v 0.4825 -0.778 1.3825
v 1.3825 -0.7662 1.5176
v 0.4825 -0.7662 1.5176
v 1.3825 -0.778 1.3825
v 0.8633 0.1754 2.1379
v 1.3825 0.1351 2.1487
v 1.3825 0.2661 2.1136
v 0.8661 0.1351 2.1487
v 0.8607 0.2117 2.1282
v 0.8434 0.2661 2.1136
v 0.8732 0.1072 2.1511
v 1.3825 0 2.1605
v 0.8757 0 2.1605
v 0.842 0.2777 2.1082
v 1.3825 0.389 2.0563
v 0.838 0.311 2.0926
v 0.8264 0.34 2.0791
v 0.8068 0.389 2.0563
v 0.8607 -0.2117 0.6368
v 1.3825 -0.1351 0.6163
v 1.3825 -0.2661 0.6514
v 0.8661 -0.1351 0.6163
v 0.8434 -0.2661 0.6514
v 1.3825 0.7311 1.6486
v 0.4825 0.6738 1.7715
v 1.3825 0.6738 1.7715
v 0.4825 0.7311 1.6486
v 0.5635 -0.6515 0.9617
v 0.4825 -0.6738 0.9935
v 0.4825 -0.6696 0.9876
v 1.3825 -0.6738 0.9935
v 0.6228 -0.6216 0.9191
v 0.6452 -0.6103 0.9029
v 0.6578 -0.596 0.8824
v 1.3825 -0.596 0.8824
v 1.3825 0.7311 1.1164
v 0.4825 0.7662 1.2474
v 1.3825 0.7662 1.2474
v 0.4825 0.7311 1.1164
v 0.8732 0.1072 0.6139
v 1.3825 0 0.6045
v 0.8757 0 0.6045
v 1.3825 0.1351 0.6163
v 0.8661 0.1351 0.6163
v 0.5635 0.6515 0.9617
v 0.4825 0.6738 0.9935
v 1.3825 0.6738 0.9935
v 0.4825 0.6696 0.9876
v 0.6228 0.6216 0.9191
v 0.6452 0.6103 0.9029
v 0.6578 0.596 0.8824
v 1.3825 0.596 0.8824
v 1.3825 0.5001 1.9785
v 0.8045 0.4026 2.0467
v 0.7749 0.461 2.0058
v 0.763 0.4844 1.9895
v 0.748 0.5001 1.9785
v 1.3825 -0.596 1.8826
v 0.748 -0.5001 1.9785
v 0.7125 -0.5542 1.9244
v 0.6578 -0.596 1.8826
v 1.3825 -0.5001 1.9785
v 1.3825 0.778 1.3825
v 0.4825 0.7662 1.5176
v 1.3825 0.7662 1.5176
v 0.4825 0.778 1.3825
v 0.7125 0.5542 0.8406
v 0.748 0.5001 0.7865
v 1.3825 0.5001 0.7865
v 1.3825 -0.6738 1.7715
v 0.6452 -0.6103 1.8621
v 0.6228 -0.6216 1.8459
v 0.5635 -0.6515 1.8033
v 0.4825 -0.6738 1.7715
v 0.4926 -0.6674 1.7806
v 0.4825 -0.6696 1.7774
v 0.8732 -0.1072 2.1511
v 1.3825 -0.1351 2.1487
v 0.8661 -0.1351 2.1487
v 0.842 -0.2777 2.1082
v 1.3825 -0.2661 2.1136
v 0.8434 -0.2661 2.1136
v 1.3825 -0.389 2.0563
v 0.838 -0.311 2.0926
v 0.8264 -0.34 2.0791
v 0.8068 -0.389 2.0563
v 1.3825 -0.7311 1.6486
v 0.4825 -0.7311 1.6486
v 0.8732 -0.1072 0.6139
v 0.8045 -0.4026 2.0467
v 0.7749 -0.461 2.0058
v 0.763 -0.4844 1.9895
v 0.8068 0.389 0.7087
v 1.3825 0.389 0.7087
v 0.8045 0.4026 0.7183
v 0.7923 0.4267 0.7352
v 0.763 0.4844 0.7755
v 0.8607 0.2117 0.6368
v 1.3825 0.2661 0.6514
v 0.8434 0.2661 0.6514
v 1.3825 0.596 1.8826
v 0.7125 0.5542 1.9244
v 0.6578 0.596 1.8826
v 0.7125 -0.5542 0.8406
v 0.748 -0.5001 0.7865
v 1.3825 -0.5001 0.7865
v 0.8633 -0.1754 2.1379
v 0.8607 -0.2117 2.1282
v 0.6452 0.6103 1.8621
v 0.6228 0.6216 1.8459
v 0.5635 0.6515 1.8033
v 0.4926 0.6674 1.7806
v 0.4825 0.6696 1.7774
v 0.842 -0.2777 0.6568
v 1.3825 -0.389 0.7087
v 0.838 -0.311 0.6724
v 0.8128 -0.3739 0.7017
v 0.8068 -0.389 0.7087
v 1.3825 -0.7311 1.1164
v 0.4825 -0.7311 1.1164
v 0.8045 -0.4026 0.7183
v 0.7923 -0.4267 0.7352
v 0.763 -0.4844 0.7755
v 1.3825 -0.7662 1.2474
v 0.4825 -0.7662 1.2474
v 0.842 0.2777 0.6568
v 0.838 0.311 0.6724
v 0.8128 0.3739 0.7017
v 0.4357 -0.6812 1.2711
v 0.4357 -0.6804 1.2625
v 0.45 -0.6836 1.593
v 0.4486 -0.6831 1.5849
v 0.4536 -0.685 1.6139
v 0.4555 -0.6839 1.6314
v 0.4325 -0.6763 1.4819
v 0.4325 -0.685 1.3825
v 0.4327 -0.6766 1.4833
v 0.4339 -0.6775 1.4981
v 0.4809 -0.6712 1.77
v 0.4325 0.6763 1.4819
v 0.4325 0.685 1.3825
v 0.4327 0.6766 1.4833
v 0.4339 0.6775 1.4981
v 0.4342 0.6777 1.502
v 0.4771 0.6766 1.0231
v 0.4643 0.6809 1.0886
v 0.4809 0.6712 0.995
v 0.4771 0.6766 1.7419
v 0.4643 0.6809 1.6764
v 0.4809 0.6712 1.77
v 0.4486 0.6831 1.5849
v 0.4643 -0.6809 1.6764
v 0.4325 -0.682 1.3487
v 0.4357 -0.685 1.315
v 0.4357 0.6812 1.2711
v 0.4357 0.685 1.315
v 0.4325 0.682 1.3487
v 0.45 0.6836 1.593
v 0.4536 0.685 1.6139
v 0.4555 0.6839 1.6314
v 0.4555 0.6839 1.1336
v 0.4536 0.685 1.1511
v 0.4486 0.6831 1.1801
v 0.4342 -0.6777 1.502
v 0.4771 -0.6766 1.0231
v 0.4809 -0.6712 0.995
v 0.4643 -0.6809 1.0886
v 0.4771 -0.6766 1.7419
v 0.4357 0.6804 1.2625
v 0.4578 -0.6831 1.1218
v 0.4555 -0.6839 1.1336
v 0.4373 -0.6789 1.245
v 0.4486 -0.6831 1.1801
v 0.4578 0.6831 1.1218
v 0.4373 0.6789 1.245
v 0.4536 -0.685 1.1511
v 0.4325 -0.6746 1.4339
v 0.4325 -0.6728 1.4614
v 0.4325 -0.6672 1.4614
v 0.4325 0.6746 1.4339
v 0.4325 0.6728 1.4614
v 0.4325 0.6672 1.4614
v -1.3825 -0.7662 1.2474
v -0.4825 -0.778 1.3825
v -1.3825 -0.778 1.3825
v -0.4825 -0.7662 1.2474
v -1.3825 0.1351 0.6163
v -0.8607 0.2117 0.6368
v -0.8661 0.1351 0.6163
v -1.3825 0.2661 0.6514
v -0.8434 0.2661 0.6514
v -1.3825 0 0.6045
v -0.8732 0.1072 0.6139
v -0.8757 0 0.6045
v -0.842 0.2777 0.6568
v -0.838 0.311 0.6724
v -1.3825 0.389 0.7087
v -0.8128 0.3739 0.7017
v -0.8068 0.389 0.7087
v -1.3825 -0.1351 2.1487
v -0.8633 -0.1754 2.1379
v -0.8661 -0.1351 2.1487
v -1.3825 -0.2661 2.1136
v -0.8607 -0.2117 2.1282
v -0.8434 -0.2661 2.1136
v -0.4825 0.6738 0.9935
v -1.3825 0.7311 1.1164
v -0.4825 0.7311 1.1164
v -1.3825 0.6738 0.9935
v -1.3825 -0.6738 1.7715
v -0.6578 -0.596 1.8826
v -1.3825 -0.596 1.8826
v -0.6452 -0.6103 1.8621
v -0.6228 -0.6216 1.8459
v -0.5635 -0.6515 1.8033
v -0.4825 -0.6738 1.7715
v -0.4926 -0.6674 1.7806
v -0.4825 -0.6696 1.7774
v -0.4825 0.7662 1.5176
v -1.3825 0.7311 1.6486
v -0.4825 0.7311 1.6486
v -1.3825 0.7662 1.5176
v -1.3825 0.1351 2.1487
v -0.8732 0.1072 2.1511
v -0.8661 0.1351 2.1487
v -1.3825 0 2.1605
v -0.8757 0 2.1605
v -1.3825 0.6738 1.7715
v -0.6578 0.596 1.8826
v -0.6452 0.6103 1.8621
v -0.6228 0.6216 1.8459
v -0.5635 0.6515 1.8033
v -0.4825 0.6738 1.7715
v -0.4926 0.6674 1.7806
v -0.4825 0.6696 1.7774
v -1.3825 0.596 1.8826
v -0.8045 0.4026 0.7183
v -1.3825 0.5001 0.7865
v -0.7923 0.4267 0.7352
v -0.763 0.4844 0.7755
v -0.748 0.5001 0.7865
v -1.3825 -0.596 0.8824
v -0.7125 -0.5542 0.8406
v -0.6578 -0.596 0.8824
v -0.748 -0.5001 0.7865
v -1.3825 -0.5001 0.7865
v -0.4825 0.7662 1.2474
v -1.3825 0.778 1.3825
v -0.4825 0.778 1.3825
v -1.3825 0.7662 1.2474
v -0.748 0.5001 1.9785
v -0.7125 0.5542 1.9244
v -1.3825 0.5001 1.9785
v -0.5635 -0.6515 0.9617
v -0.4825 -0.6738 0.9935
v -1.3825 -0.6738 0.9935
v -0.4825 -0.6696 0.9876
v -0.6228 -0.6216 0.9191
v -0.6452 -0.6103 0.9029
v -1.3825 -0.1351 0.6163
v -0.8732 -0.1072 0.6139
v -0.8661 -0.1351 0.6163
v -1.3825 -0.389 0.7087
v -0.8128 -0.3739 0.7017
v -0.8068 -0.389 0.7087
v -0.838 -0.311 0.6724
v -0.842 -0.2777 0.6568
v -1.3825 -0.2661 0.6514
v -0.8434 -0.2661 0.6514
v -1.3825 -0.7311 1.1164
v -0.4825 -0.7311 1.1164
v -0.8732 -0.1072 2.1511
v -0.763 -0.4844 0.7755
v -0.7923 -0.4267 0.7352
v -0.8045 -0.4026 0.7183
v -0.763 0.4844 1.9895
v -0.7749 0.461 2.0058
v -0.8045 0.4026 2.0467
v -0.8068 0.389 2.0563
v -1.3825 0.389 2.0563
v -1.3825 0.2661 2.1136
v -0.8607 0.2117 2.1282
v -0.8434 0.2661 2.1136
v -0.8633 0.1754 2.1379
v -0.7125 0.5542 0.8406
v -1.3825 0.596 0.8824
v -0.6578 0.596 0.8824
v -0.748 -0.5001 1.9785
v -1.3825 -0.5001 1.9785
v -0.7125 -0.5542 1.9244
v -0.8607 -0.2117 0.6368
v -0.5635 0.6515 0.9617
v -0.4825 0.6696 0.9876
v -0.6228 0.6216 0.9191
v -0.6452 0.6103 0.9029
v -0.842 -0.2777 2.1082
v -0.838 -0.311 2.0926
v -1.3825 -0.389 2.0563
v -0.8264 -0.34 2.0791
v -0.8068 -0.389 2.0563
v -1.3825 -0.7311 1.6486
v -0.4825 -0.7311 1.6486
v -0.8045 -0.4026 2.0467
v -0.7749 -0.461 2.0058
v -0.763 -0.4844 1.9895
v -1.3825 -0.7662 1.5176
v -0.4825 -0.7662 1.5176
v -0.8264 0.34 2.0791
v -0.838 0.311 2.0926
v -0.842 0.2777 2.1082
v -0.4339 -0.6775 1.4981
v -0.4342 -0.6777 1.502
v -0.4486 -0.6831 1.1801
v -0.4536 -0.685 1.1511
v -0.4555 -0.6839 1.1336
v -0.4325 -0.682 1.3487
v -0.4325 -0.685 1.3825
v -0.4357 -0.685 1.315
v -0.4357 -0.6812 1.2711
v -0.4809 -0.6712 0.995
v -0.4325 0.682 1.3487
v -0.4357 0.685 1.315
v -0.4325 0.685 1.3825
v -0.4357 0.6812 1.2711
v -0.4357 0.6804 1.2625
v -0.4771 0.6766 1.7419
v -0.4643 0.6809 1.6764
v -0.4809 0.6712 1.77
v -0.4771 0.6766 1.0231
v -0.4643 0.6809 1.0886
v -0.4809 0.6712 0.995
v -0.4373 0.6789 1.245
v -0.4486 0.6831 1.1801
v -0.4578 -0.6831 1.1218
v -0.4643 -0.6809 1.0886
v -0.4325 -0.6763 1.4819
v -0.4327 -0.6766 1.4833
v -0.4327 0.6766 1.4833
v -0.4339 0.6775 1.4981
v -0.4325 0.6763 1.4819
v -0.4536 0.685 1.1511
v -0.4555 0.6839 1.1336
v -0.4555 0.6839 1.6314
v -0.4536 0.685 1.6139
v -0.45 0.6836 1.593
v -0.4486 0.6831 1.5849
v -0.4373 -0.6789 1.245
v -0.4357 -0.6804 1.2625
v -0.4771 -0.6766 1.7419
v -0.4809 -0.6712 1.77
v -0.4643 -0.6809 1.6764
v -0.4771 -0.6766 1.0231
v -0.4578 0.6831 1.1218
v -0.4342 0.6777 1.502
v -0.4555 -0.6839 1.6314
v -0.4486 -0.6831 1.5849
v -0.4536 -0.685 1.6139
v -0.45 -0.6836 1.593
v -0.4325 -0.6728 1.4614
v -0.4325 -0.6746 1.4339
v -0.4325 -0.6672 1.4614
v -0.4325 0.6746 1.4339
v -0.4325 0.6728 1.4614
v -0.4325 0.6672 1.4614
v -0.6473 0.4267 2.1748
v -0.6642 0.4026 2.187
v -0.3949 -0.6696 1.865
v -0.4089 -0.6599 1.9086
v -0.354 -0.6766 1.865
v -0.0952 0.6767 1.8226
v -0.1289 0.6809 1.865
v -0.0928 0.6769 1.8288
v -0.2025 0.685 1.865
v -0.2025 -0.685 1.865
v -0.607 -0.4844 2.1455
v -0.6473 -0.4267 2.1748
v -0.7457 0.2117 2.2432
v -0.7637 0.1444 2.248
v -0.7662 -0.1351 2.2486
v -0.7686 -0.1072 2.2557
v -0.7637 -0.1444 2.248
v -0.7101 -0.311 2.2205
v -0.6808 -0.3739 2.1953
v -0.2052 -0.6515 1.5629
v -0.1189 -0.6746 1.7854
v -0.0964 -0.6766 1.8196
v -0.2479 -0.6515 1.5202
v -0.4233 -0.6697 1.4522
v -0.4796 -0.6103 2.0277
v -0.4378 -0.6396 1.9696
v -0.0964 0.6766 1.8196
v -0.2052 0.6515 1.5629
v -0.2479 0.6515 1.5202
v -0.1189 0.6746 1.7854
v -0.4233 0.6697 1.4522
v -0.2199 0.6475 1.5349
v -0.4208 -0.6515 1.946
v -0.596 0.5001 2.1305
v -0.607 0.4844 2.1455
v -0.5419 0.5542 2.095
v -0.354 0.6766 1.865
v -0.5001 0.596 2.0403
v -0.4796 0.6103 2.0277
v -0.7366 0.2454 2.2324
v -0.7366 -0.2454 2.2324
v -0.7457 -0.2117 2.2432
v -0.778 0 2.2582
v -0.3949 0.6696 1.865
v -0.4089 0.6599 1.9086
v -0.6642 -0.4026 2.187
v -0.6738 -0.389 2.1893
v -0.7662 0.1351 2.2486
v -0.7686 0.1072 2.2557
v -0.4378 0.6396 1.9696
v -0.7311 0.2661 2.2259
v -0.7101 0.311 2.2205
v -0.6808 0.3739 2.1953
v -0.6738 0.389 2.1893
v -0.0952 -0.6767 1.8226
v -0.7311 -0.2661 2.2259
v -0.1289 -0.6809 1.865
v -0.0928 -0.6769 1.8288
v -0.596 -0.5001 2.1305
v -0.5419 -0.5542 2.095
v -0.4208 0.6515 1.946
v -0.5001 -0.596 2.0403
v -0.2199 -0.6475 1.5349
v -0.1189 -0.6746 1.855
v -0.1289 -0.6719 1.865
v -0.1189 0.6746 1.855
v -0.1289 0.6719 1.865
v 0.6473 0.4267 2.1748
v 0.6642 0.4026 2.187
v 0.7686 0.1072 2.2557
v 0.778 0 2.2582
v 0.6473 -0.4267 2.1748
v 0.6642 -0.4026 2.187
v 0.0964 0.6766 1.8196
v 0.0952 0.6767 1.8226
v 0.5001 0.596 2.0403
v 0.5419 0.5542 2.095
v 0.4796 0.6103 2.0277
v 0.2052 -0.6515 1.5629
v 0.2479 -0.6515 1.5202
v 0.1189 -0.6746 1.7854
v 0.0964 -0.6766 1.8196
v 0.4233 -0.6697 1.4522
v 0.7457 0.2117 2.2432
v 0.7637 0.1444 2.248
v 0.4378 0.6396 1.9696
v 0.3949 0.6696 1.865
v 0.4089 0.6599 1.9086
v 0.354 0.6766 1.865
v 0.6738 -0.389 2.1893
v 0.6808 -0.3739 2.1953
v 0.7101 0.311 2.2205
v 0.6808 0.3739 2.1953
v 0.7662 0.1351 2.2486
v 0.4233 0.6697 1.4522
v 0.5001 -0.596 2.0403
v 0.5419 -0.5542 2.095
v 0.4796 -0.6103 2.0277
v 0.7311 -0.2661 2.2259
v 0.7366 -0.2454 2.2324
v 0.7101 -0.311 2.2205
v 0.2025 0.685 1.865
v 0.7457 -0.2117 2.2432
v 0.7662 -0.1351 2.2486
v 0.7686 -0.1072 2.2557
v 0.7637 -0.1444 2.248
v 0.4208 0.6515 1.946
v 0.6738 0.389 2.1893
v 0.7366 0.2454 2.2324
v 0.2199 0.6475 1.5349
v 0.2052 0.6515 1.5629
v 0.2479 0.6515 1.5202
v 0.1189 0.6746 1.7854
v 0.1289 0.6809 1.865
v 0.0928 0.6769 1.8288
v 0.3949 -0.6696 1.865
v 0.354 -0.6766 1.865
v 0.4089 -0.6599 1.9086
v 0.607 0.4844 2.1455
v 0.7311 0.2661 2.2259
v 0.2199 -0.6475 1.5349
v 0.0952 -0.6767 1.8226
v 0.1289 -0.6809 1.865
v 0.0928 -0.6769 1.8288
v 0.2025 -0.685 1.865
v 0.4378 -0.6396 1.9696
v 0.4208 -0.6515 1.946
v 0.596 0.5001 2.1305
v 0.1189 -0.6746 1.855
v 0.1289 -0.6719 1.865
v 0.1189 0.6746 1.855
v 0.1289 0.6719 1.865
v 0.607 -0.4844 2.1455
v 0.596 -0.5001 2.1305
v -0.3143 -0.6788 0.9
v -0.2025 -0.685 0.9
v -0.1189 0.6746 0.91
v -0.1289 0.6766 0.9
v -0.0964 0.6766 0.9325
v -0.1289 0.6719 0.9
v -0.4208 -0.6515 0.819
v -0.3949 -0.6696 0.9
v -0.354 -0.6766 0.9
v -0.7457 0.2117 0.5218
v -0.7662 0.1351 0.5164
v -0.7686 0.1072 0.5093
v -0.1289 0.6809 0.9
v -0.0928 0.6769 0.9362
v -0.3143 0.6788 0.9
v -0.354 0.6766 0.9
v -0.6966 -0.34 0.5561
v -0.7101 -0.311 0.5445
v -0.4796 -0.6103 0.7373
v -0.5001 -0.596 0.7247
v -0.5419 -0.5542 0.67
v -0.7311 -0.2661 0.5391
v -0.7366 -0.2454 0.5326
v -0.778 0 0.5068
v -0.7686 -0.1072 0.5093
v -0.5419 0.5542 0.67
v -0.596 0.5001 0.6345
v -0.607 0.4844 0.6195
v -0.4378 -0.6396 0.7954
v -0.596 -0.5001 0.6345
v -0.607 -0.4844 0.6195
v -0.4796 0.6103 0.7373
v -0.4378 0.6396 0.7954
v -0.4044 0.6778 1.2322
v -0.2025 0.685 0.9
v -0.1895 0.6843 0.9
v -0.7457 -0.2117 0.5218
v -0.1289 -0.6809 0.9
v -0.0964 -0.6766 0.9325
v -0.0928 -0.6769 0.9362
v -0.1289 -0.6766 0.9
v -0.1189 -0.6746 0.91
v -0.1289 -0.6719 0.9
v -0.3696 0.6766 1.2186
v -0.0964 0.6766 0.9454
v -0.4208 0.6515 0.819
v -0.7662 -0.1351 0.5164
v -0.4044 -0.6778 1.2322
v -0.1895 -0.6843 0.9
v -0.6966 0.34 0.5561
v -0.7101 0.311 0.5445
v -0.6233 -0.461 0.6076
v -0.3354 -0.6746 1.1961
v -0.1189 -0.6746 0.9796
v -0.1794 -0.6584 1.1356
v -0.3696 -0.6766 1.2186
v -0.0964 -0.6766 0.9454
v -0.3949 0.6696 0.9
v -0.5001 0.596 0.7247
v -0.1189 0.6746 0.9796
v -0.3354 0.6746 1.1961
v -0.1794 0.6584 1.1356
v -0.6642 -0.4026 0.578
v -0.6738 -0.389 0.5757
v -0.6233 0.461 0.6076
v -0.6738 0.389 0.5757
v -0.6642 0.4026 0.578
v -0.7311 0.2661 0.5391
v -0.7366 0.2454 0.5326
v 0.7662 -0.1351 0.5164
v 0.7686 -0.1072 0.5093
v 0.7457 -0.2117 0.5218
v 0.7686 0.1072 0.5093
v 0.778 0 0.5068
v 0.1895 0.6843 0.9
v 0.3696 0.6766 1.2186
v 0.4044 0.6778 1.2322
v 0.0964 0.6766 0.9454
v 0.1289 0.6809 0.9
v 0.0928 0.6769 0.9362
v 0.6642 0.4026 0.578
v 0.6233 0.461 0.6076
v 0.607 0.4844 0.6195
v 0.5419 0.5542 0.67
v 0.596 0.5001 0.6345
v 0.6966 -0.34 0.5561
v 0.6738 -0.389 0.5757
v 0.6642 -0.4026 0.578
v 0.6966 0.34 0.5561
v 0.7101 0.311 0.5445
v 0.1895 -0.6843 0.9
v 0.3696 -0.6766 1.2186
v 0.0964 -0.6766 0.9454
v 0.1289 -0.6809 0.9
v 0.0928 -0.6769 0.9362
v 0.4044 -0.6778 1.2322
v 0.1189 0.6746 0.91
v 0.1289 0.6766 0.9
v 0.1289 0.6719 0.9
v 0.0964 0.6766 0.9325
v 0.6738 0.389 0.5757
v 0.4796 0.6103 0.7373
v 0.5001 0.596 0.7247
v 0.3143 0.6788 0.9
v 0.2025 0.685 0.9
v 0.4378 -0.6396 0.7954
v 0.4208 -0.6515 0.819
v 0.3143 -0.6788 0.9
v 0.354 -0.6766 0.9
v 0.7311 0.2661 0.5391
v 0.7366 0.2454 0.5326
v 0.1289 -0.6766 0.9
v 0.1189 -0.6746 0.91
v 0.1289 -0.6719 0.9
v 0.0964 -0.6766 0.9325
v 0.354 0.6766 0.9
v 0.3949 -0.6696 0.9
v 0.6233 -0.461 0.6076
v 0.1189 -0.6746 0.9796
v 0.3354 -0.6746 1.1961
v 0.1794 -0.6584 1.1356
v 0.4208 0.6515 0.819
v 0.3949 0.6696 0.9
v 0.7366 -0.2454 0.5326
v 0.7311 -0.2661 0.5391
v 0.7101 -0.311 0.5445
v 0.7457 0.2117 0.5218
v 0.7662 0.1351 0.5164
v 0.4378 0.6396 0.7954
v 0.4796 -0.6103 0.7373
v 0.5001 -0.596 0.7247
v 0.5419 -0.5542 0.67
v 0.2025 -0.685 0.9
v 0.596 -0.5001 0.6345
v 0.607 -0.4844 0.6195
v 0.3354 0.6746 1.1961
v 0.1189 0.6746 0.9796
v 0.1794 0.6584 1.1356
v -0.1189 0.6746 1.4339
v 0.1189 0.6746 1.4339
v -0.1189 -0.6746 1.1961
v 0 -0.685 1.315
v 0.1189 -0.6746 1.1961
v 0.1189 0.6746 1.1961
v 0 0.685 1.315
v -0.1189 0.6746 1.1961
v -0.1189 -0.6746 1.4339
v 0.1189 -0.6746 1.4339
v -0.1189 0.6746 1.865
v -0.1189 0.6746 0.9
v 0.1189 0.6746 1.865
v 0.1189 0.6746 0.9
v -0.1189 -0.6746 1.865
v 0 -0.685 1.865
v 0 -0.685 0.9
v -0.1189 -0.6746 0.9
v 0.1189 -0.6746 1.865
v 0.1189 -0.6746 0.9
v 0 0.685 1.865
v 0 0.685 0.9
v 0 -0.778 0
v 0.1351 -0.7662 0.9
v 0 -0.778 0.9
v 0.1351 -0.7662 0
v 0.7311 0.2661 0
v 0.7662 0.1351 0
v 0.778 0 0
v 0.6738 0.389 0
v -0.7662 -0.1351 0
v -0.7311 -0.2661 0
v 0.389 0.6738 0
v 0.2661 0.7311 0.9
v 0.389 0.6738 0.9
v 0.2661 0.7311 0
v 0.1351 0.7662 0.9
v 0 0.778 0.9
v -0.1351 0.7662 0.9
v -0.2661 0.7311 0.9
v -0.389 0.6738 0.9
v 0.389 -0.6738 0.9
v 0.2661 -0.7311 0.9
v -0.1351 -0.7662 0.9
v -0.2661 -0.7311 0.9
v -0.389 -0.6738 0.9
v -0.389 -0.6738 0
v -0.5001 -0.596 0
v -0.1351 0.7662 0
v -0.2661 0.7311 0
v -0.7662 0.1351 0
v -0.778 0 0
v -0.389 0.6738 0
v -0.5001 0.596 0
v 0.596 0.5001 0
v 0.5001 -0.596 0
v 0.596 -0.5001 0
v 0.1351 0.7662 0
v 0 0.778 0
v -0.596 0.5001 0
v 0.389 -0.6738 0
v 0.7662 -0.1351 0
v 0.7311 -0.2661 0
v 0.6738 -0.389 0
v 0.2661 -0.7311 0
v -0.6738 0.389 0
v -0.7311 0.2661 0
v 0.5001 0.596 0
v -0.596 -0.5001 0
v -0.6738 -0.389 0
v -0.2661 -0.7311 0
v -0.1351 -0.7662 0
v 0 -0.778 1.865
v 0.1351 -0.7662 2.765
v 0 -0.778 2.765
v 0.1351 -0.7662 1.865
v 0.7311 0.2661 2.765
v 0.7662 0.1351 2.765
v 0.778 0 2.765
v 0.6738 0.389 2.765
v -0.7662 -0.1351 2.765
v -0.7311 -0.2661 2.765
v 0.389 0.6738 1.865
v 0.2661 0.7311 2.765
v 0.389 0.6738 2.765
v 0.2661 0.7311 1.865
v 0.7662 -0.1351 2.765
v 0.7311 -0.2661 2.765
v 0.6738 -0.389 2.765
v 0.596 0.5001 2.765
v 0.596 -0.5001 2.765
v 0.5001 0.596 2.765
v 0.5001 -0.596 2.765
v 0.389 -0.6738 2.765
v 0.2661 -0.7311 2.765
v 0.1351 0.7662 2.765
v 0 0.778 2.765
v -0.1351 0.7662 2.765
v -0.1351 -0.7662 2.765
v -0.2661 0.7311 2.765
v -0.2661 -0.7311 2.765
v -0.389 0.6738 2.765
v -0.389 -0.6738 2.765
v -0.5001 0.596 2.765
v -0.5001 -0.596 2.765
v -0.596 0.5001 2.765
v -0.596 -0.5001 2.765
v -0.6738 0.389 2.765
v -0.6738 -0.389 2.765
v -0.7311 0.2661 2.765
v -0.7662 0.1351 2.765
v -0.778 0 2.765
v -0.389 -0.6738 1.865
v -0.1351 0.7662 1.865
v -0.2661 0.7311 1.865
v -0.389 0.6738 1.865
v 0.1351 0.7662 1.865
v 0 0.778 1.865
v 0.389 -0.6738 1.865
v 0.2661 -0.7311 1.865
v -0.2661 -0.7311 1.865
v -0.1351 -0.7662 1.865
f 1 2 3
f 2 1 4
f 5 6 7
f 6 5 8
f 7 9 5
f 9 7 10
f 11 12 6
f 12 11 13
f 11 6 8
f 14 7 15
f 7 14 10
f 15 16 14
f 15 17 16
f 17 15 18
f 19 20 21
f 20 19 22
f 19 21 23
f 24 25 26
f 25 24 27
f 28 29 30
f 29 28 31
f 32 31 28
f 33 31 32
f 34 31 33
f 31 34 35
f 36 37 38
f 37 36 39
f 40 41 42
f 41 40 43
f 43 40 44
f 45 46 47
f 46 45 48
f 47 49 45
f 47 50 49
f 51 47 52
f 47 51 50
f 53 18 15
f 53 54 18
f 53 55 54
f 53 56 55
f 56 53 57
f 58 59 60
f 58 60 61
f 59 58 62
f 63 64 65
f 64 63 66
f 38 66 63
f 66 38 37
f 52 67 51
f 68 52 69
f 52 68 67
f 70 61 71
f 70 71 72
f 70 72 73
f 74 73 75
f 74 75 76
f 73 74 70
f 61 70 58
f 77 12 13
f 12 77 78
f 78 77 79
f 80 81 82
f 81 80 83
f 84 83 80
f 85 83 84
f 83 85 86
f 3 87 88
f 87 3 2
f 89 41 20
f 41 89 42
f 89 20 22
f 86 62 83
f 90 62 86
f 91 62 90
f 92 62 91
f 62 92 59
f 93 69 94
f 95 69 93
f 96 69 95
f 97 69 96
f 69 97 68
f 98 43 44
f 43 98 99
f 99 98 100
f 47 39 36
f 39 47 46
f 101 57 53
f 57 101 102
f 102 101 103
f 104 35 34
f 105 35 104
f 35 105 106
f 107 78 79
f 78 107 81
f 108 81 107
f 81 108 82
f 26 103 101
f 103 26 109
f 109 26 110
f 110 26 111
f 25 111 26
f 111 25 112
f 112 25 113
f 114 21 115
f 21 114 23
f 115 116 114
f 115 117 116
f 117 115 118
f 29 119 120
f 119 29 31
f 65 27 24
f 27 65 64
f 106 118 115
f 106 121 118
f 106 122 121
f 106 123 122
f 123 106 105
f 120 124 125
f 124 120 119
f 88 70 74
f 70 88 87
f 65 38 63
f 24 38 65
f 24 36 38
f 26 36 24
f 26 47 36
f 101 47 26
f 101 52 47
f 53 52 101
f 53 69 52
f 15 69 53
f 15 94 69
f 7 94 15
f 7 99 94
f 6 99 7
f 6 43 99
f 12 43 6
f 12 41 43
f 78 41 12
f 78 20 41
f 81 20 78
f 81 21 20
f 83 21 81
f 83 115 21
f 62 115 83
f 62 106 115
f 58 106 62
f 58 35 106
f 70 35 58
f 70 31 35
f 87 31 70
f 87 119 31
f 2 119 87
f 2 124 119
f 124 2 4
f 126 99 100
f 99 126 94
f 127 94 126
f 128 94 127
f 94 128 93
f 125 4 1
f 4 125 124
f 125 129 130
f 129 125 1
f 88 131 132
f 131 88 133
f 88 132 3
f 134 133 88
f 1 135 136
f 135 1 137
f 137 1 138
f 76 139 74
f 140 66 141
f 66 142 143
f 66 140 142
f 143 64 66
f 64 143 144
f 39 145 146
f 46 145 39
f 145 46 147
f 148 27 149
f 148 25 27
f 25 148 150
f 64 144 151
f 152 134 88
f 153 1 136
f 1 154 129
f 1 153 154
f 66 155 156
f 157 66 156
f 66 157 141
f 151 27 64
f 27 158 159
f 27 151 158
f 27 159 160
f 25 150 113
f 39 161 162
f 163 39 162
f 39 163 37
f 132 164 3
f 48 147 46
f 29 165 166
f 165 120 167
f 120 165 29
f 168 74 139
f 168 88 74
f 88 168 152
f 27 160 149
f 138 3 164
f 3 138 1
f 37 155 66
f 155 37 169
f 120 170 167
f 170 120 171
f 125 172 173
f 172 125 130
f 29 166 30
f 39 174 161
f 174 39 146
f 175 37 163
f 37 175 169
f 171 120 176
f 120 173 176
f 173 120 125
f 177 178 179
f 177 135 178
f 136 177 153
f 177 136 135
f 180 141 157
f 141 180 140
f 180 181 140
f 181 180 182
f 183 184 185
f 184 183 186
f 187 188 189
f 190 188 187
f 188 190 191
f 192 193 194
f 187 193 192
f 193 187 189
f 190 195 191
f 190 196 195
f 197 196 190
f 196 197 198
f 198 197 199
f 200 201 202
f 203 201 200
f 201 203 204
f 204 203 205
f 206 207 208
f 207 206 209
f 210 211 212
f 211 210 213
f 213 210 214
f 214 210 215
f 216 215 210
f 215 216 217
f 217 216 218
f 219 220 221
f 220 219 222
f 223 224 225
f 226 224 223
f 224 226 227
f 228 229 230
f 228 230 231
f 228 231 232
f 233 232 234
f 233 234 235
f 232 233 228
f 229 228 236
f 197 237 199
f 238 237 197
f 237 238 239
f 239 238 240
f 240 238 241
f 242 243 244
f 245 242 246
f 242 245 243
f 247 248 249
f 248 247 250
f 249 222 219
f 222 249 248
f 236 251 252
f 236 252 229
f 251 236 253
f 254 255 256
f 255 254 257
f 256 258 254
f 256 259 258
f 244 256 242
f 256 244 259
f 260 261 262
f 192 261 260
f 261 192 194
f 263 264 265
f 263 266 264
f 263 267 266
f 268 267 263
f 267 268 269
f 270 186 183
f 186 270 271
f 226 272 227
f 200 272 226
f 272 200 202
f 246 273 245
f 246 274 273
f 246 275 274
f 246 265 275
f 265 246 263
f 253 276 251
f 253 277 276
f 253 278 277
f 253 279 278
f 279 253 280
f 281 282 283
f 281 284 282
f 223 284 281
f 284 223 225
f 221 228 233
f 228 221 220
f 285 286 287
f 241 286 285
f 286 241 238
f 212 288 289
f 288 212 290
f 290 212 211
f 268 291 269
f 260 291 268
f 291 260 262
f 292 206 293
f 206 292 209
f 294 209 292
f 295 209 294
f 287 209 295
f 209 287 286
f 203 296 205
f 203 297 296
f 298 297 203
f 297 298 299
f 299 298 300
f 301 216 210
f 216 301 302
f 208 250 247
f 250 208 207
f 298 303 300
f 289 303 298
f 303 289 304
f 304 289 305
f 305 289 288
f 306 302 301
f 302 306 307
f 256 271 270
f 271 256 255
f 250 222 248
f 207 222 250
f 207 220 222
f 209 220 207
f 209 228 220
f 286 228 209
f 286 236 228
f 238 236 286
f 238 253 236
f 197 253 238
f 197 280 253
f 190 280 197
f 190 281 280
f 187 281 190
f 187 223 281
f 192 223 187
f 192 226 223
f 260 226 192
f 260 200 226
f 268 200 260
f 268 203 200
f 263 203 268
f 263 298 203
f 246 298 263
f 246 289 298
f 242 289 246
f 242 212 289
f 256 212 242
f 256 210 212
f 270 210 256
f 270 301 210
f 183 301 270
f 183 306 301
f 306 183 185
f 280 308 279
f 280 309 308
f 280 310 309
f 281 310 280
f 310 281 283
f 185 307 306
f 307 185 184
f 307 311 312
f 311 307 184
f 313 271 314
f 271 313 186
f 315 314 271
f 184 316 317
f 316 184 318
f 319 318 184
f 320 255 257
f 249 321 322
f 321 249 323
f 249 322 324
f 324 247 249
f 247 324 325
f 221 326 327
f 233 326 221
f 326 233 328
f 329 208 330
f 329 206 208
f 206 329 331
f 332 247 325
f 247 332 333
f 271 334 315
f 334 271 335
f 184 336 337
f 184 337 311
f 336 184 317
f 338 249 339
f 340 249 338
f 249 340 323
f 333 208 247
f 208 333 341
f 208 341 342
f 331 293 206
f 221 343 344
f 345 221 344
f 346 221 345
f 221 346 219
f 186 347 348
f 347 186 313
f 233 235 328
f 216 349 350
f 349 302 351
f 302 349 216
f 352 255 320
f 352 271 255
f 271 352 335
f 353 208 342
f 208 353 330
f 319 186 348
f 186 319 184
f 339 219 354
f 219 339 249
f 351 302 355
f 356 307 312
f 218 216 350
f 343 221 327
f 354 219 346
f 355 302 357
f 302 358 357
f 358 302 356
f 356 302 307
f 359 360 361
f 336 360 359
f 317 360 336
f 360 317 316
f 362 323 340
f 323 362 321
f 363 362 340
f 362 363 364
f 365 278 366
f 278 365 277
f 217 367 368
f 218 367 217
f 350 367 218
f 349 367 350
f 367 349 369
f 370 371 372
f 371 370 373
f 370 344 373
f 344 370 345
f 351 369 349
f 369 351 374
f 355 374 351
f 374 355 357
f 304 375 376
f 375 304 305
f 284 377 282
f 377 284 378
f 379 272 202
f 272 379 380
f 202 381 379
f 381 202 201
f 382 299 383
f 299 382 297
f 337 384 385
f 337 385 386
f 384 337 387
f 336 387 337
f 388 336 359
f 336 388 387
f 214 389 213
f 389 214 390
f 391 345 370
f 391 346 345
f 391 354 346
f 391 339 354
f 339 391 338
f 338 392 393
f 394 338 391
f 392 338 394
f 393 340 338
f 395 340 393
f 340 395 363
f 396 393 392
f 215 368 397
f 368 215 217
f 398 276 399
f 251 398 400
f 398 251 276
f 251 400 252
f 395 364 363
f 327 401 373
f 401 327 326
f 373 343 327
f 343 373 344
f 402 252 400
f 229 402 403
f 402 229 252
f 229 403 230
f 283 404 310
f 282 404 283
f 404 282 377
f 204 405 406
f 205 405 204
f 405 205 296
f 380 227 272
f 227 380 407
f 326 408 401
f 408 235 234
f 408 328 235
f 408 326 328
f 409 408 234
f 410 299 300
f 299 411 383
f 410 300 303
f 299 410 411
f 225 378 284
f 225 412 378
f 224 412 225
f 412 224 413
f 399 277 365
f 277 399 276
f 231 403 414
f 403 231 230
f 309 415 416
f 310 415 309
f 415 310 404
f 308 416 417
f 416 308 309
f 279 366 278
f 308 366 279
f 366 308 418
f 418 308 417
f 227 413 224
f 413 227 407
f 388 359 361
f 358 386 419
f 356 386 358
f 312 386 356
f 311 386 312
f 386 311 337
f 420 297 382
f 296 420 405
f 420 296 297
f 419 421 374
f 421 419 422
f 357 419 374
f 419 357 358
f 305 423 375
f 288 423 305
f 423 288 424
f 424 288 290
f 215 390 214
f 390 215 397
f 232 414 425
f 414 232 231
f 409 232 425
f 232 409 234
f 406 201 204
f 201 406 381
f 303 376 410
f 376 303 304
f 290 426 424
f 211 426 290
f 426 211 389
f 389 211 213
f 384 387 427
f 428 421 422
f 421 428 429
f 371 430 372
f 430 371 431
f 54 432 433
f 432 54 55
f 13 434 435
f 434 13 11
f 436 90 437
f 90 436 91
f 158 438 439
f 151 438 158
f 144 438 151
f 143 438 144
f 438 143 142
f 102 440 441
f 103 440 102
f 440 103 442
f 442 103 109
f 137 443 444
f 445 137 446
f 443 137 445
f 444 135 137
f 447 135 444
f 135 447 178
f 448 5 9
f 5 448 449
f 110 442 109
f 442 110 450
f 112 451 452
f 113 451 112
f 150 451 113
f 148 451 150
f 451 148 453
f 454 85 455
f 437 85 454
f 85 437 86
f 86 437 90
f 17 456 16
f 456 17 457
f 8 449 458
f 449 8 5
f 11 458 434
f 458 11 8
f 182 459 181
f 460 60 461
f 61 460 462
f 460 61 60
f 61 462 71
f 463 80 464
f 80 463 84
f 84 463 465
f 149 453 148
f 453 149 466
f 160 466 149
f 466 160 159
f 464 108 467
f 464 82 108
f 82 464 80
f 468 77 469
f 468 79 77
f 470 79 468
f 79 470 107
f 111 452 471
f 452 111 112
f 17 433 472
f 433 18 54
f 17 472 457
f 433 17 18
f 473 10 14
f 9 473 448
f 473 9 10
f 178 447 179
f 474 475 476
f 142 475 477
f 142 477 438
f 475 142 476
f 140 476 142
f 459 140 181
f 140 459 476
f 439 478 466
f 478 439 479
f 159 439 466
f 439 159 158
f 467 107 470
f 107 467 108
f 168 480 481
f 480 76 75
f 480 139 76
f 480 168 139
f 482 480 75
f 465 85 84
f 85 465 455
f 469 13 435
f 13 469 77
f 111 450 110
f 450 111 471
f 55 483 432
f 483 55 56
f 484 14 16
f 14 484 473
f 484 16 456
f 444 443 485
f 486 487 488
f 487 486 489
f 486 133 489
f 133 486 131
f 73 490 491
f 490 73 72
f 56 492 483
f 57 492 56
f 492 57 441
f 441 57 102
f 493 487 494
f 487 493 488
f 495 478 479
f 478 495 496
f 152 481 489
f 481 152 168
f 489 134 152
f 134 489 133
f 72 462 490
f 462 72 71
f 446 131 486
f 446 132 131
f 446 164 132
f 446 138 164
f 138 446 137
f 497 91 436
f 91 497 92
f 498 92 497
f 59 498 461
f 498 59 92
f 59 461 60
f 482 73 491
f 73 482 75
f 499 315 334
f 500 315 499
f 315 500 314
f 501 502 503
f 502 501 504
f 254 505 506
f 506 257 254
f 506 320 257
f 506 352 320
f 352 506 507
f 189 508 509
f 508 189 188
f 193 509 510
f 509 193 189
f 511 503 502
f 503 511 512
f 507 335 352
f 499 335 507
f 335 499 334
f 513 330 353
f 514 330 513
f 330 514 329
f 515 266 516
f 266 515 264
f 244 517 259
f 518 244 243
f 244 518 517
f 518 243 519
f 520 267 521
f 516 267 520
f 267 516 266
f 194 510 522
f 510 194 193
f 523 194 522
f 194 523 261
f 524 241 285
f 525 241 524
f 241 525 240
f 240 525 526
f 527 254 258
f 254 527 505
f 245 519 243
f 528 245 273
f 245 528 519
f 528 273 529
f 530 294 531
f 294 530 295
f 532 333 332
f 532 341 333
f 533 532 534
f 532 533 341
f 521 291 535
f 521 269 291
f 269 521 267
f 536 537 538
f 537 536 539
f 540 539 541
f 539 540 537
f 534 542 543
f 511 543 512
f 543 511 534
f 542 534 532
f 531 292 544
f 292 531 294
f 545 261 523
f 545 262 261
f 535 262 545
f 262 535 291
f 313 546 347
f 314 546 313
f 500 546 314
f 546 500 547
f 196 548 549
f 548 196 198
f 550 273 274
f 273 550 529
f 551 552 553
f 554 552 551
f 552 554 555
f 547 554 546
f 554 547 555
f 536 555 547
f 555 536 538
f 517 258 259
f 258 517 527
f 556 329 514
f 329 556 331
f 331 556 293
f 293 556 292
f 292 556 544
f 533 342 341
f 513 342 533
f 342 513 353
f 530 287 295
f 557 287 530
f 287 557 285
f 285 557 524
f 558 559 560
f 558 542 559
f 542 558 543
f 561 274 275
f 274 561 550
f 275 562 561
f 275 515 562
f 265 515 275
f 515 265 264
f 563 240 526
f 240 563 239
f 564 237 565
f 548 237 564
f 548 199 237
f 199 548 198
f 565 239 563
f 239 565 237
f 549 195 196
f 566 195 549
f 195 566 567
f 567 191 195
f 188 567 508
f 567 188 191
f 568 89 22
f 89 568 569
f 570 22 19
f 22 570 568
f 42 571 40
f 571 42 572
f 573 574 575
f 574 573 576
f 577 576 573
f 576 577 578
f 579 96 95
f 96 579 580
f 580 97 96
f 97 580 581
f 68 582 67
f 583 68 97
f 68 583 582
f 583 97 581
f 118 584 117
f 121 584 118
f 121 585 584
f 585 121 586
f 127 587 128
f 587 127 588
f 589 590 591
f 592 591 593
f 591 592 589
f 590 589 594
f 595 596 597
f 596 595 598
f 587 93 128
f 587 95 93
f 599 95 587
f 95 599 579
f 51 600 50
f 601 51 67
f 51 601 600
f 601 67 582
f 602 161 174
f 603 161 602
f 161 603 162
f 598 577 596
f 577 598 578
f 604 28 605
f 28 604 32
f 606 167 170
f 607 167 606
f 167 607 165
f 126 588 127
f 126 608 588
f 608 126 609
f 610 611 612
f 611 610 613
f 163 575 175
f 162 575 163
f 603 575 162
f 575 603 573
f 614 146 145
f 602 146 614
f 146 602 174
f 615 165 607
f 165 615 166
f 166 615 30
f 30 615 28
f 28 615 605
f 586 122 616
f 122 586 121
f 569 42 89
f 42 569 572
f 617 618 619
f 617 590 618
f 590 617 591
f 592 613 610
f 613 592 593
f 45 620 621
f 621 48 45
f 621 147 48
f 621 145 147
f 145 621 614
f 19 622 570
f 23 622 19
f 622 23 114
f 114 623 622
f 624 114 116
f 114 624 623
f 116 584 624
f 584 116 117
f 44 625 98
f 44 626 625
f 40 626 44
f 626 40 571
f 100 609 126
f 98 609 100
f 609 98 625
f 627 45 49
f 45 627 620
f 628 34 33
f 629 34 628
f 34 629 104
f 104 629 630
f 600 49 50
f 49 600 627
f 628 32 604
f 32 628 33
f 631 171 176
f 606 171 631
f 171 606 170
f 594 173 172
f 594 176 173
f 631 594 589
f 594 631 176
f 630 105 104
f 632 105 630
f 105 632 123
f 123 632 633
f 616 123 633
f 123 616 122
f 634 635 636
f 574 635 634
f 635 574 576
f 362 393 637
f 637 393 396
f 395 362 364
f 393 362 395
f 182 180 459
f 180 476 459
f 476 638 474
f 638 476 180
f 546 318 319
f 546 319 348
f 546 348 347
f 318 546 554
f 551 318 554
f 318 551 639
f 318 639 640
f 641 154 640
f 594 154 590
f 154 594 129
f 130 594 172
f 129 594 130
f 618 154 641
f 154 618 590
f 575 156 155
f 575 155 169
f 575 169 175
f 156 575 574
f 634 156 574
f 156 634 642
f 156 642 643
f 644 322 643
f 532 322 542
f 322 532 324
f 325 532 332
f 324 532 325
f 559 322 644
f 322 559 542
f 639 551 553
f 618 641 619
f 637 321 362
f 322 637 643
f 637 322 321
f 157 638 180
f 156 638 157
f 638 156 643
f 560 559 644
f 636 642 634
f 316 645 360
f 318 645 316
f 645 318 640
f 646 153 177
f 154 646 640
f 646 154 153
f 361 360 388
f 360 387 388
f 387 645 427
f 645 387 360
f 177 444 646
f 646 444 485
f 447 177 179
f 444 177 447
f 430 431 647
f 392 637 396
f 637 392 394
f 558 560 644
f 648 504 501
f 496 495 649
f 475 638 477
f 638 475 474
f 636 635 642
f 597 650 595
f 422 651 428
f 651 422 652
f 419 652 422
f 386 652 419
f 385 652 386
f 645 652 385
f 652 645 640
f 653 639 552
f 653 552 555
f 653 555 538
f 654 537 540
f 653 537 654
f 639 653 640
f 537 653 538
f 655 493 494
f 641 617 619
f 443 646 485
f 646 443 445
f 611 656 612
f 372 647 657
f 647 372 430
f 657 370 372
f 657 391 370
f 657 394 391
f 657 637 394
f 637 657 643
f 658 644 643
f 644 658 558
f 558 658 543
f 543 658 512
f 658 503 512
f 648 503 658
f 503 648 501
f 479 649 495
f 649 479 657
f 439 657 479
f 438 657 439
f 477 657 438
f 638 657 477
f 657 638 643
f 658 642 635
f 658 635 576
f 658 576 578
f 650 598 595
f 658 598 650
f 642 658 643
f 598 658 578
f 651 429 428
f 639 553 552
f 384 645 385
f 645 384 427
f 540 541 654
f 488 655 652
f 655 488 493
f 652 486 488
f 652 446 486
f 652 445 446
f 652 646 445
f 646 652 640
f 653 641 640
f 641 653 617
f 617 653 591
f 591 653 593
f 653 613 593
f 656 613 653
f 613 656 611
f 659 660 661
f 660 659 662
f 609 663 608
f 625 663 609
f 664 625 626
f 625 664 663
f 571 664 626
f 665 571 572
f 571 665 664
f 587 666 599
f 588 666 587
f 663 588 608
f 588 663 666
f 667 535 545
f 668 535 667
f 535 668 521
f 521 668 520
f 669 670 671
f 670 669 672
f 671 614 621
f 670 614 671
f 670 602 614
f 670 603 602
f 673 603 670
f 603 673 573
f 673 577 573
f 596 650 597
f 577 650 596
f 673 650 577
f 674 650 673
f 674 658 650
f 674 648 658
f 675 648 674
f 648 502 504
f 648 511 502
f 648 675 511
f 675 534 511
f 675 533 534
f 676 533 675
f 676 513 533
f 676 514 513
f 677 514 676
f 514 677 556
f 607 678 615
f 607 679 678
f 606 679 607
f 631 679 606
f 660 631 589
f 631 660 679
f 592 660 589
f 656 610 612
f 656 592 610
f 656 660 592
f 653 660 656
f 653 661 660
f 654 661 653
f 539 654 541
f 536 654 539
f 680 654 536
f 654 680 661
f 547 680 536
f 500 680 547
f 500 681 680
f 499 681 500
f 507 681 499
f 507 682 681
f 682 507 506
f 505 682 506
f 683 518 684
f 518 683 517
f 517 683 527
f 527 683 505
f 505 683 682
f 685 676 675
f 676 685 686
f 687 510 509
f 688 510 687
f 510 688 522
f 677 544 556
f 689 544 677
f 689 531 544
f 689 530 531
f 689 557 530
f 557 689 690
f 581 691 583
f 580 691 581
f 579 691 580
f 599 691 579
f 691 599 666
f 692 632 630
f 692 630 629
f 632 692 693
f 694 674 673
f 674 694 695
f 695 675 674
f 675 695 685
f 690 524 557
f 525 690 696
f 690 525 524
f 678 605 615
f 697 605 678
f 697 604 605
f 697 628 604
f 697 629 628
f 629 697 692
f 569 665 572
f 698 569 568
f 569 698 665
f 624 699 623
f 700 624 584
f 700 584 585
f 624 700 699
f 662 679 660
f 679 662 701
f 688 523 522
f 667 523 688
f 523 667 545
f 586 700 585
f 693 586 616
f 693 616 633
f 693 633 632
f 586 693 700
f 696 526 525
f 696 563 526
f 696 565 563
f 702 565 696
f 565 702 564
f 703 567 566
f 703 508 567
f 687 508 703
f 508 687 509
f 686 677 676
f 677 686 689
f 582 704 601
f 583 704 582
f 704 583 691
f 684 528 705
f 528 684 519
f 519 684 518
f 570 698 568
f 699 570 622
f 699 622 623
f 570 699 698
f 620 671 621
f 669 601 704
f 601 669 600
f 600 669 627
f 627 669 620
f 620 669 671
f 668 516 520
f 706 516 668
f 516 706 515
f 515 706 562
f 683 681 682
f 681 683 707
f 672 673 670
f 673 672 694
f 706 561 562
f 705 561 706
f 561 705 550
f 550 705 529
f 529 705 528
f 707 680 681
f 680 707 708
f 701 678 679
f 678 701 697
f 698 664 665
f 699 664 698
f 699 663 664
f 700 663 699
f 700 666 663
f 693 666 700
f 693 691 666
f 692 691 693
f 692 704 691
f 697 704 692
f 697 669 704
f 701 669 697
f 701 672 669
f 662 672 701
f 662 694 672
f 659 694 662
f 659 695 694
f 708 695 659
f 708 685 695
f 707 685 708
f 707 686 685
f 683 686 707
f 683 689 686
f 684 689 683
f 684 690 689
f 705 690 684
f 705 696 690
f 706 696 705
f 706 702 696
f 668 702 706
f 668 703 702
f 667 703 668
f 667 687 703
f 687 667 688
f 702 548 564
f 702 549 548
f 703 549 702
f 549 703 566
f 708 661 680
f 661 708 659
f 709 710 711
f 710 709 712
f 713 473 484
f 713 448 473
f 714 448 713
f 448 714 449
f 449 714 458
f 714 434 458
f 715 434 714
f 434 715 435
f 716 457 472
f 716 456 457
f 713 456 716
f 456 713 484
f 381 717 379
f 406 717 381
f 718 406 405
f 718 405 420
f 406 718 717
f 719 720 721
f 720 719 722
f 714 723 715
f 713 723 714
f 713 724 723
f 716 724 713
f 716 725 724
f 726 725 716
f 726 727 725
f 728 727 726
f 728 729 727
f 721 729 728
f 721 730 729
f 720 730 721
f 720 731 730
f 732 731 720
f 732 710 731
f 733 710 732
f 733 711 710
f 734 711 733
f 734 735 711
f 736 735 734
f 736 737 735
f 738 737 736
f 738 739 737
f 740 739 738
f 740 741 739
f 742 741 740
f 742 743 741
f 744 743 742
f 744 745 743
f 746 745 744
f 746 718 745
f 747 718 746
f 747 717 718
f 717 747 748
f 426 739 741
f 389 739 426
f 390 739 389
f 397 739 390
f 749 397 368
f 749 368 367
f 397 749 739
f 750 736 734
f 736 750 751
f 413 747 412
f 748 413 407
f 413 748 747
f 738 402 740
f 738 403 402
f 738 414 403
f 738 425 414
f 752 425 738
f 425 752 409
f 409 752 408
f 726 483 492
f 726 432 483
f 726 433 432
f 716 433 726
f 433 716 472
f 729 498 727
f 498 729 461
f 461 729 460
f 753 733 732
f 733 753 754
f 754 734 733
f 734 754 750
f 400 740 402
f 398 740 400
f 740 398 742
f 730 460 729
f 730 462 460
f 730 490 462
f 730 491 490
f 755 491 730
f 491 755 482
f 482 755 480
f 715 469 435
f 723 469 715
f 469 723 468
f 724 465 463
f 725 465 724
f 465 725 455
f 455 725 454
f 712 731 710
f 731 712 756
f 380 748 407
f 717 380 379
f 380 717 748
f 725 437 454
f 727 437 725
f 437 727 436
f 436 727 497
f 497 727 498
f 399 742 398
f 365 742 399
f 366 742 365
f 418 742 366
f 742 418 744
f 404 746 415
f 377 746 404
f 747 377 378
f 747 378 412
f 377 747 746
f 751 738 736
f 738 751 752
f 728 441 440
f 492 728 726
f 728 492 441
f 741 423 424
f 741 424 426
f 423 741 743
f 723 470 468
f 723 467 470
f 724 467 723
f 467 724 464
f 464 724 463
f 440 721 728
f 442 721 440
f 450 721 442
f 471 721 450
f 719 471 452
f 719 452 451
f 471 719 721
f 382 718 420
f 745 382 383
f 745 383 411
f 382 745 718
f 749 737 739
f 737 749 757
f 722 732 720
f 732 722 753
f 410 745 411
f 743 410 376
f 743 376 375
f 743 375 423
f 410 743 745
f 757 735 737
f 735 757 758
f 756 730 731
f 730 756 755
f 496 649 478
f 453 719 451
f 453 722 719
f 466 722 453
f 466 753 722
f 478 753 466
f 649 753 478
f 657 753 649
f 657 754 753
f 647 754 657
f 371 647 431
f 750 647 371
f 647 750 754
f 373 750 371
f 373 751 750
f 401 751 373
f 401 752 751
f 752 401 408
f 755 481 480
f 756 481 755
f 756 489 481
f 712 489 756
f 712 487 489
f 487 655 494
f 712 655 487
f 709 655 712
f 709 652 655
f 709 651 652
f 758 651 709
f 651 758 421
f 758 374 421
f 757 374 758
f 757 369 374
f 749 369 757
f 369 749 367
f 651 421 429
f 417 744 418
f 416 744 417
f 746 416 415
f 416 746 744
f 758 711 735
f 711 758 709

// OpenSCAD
//
// Pipe dimensions
//
PipeInnerDiameter   = 1; // Inner Diameter of pipe, smallest measurement if asymmetrical
PipeOuterDiameter   = 2; // Outer Diameter of pipe, largest measurement if asymmetrical
PipeTaperedDiameter = 3; // Threads are tapered, smallest measurement if asymmetrical
PipeThreadLength    = 4; // Total length of the pipe thread
PipeThreadDepth     = 5; // Depth when fully seated
PipeClearanceSnug   = 6; // Added to the diameter, should not slip (default)
PipeClearanceLoose  = 7; // Added to the diameter, should slide freely
PipeFn              = 8; // Number of sides
PipeWeightPerUnit   = 9;

function PipeClearanceSnug()  = PipeClearanceSnug;
function PipeClearanceLoose() = PipeClearanceLoose;


function PipeClearance(pipe, clearance) =
           (clearance != undef) ? lookup(clearance, pipe) : 0;

function PipeOuterDiameter(pipe, clearance, clearanceSign=1) =
           lookup(PipeOuterDiameter, pipe) + (PipeClearance(pipe, clearance)*clearanceSign);

function PipeInnerDiameter(pipe, clearance, clearanceSign=1) =
           lookup(PipeInnerDiameter, pipe) + (PipeClearance(pipe, clearance)*clearanceSign);

function PipeOuterRadius(pipe, clearance, clearanceSign=1) =
           PipeOuterDiameter(pipe, clearance, clearanceSign)/2;

function PipeInnerRadius(pipe, clearance, clearanceSign=1) =
           PipeInnerDiameter(pipe, clearance, clearanceSign)/2;

function PipeTaperedDiameter(pipe) =
           lookup(PipeTaperedDiameter, pipe);

function PipeTaperedRadius(pipe, clearance, clearanceSign=1) =
           PipeTaperedDiameter(pipe, clearance, clearanceSign)/2;

function PipeThreadLength(pipe) =
           lookup(PipeThreadLength, pipe);

function PipeThreadDepth(pipe) =
           lookup(PipeThreadDepth, pipe);

function PipeWall(pipe) =
           PipeOuterRadius(pipe) - PipeInnerRadius(pipe);

function PipeFn(pipe, fn) =
           (fn == undef) ? lookup(PipeFn, pipe) : fn;

function PipeOuterCircumference(pipe, clearance, clearanceSign=1) =
           3.14*PipeOuterDiameter(pipe, clearance, clearanceSign);

function PipeInnerCircumference(pipe, clearance, clearanceSign=1) =
           3.14*PipeInnerDiameter(pipe, clearance, clearanceSign);


module Pipe2d(pipe, clearance=PipeClearanceSnug(), clearanceSign=1, hollow=false, extraRadius=0, $fn=undef) {
  difference() {
    circle(r=PipeOuterRadius(pipe=pipe, clearance=clearance, clearanceSign=clearanceSign)+extraRadius,
         $fn=PipeFn(pipe, $fn));

    if (hollow)
    circle(r=PipeInnerRadius(pipe, clearance),
         $fn=PipeFn(pipe, $fn));
  }
};
module Pipe(pipe, length = 1, clearance=PipeClearanceSnug(), center=false, hollow=false) {
  translate([0,0,center ? -length/2 : 0])
  linear_extrude(height=length)
  Pipe2d(pipe=pipe, clearance=clearance, hollow=hollow);
};

//Pipe(PipeOneInch, clearance=PipeClearanceLoose);


// 1/4" Pipe
function Spec_PipeOneQuarterInch() = [
  [PipeInnerDiameter,   0.265],
  [PipeOuterDiameter,   0.415],
  [PipeTaperedDiameter, 0.415], // TODO: Verify
  [PipeThreadLength,    0.5],   // TODO: Verify
  [PipeThreadDepth,     0.25],  // TODO: Verify
  [PipeClearanceSnug,   0.015], // TODO: Verify
  [PipeClearanceLoose,  0.027], // TODO: Verify
  [PipeFn,              20],
  [PipeWeightPerUnit,   0] // TODO
];

// 12GaugeChamber - 12ga Chamber tolerances are much pickier than ERW pipe
function Spec_12GaugeChamber() = [
  [PipeInnerDiameter,   0.78],
  [PipeFn,              30]
];

// 3/4" Sch40 Pipe
function Spec_PipeThreeQuarterInch() = [
  [PipeInnerDiameter,   0.81],
  [PipeOuterDiameter,   1.05],
  [PipeTaperedDiameter, 1.018],
  [PipeThreadLength,    0.9],
  [PipeThreadDepth,     0.5],
  [PipeClearanceSnug,   0.002],
  [PipeClearanceLoose,  0.01],
  [PipeFn,              30],
  [PipeWeightPerUnit,   40]
];

// 3/4" Sch80 Pipe
function Spec_PipeThreeQuarterInchSch80() = [
  [PipeInnerDiameter,   0.73],
  [PipeOuterDiameter,   1.05],
  [PipeTaperedDiameter, 1.018],
  [PipeThreadLength,    0.9],
  [PipeThreadDepth,     0.5],
  [PipeClearanceSnug,   0.002],
  [PipeClearanceLoose,  0.01],
  [PipeFn,              40],
  [PipeWeightPerUnit,   40]
];

// 3/4" Sch80 Stainless Pipe
function Spec_PipeThreeQuarterInchSch80Stainless() = [
  [PipeInnerDiameter,   0.76],
  [PipeOuterDiameter,   1.055],
  [PipeTaperedDiameter, 1.018],
  [PipeThreadLength,    0.9],
  [PipeThreadDepth,     0.5],
  [PipeClearanceSnug,   0.002],
  [PipeClearanceLoose,  0.02],
  [PipeFn,              40],
  [PipeWeightPerUnit,   40]
];

// 1" Pipe
function Spec_PipeOneInch() = [
  [PipeInnerDiameter,   1.055],
  [PipeOuterDiameter,   1.315],
  [PipeTaperedDiameter, 1.285],
  [PipeThreadLength,    0.982],
  [PipeThreadDepth,     0.5], // TODO: Verify
  [PipeClearanceSnug,   0.002],
  [PipeClearanceLoose,  0.01],
  [PipeFn,              50],
  [PipeWeightPerUnit,   0] // TODO
];

// 1" Pipe Sch80
function Spec_PipeOneInchSch80() = [
  [PipeInnerDiameter,   0.958],
  [PipeOuterDiameter,   1.315],
  [PipeTaperedDiameter, 1.285],
  [PipeThreadLength,    0.982],
  [PipeThreadDepth,     0.5], // TODO: Verify
  [PipeClearanceSnug,   0.002],
  [PipeClearanceLoose,  0.01],
  [PipeFn,              50],
  [PipeWeightPerUnit,   0] // TODO
];

// 1.125x0.813" DOM Tubing
function Spec_TubingOnePointOneTwoFive() = [
  [PipeInnerDiameter,   0.813],
  [PipeOuterDiameter,   1.125],
  [PipeTaperedDiameter, 1.018],
  [PipeThreadLength,    0.9],
  [PipeThreadDepth,     0.5],
  [PipeClearanceSnug,   0.020],
  [PipeClearanceLoose,  0.022],
  [PipeFn,              50],
  [PipeWeightPerUnit,   42]
];

// 1.628x0.1.125" DOM Tubing
function Spec_Tubing1628x1125() = [
  [PipeInnerDiameter,   1.125],
  [PipeOuterDiameter,   1.628],
  [PipeTaperedDiameter, 0.0],
  [PipeThreadLength,    0.0],
  [PipeThreadDepth,     0.0],
  [PipeClearanceSnug,   0.020],
  [PipeClearanceLoose,  0.022],
  [PipeFn,              40],
  [PipeWeightPerUnit,   0]
];

// 0.75x0.410" DOM Tubing (Just guessing)
function Spec_TubingZeroPointSevenFive() = [
  [PipeInnerDiameter,   0.410],
  [PipeOuterDiameter,   0.750],
  [PipeTaperedDiameter, 0.750],
  [PipeThreadLength,    0.0],
  [PipeThreadDepth,     0.0],
  [PipeClearanceSnug,   0.020],
  [PipeClearanceLoose,  0.022],
  [PipeFn,              30],
  [PipeWeightPerUnit,   42]
];

// 0.375" OD DOM Tubing (Just guessing)
function Spec_TubingThreeEighthsInch() = [
  [PipeInnerDiameter,   0.23],
  [PipeOuterDiameter,   0.375],
  [PipeTaperedDiameter, 0.375],
  [PipeThreadLength,    0.0],
  [PipeThreadDepth,     0.0],
  [PipeClearanceSnug,   0.020],
  [PipeClearanceLoose,  0.022],
  [PipeFn,              20],
  [PipeWeightPerUnit,   0]
];

// 5/16" Brake Line, for .22LR
function Spec_FiveSixteenthInchBrakeLine() = [
  [PipeInnerDiameter,   0.22],
  [PipeOuterDiameter,   0.3125],
  [PipeTaperedDiameter, 0.3125],
  [PipeThreadLength,    0],
  [PipeThreadDepth,     0],
  [PipeClearanceSnug,   0.02],
  [PipeClearanceLoose,  0.035],
  [PipeFn,              20],
  [PipeWeightPerUnit,   42]
];

// 3/4" OD x 5/8" ID Tube
function Spec_TubingThreeQuarterByFiveEighthInch() = [
  [PipeInnerDiameter,   0.645],
  [PipeOuterDiameter,   0.75],
  [PipeTaperedDiameter, 0.75],
  [PipeThreadLength,    0],
  [PipeThreadDepth,     0],
  [PipeClearanceSnug,   0.03],
  [PipeClearanceLoose,  0.035],
  [PipeFn,              40],
  [PipeWeightPerUnit,   0] // TODO
];

// 0.56x9mm Barrel Blank
function Spec_PointFiveSix9mmBarrel() = [
  [PipeInnerDiameter,   0.0],
  [PipeOuterDiameter,   0.56],
  [PipeTaperedDiameter, 0.56],
  [PipeThreadLength,    0],
  [PipeThreadDepth,     0],
  [PipeClearanceSnug,   0.020],
  [PipeClearanceLoose,  0.022],
  [PipeFn,              25],
  [PipeWeightPerUnit,   0]
];



echo (PipeOuterCircumference(Spec_PointFiveSix9mmBarrel()));


// Fittings: Tee
TeeOuterDiameter   = 1; // Diameter of the body, not the rim
TeeWidth           = 2; // Across the top of the tee, side-to-side
TeeHeight          = 3; // From the middle of the bottom rim to the top of the body
TeeHeightClearance = 4; // Range for the height
TeeInnerDiameter   = 5; // Diameter of the threaded hole
TeeRimDiameter     = 6; // Diameter of the tee rim
TeeRimWidth        = 7; // Width of the tee rim
TeeInfillSphere    = 8; // Diameter of the infill sphere, cuts out the casting infill between the tee sections
TeeInfillOffset    = 9; // Offset for the infill sphere from center

// Anvil USA 3/4" Cast Iron Pipe Tee (DANGEROUS, OUTSIDE SPEC)
function Spec_TeeThreeQuarterInch() = [
  [TeeOuterDiameter,   1.41],
  [TeeWidth,           2.64],
  [TeeHeight,          2],     // Measured 1.998-2.042
  [TeeHeightClearance, 0.022], // Derived from (height range/2)
  [TeeInnerDiameter,   0.88],
  [TeeRimDiameter,     1.54], // Measured: 1.494-1.523
  [TeeRimWidth,        0.32],
  [TeeInfillSphere,    0.10],
  [TeeInfillOffset,    0.41]
];

// Anvil USA 3/4" Forged Steel Pipe Tee
function Spec_AnvilForgedSteel_TeeThreeQuarterInch() = [
  [TeeOuterDiameter,   1.37],
  [TeeWidth,           2.765],
  [TeeHeight,          2],     // Measured 1.998-2.042
  [TeeHeightClearance, 0.022], // Derived from (height range/2)
  [TeeInnerDiameter,   0.88],
  [TeeRimDiameter,     1.556],
  [TeeRimWidth,        0.9],
  [TeeInfillSphere,    0.10],
  [TeeInfillOffset,    0.41]
];

// Chinese 304SS-150 3/4" Tee (DANGEROUS, OUTSIDE SPEC)
function Spec_304SS_150_TeeThreeQuarterInch() = [
  [TeeOuterDiameter,   1.37],
  [TeeWidth,           2.64],
  [TeeHeight,          2],     // Measured 1.998-2.042
  [TeeHeightClearance, 0.022], // Derived from (height range/2)
  [TeeInnerDiameter,   0.88],
  [TeeRimDiameter,     1.4],
  [TeeRimWidth,        0.31],
  [TeeInfillSphere,    0.10],
  [TeeInfillOffset,    0.41]
];

function TeeOuterDiameter(tee) = lookup(TeeOuterDiameter, tee);
function TeeOuterRadius(tee)   = lookup(TeeOuterDiameter, tee)/2;
function TeeWidth(tee)         = lookup(TeeWidth, tee);
function TeeHeight(tee)        = lookup(TeeHeight, tee);
function TeeInnerDiameter(tee) = lookup(TeeInnerDiameter, tee);
function TeeInnerRadius(tee)   = lookup(TeeInnerDiameter, tee)/2;
function TeeRimDiameter(tee)   = lookup(TeeRimDiameter, tee);
function TeeRimRadius(tee)     = lookup(TeeRimDiameter, tee)/2;
function TeeRimWidth(tee)      = lookup(TeeRimWidth, tee);
function TeeCenter(tee)        = lookup(TeeWidth, tee)/2; //lookup(TeeHeight, tee) - TeeOuterRadius(tee);

function TeePipeEndOffset(tee, pipe) = TeeCenter(tee)-PipeThreadDepth(pipe);

module Tee(tee, $fn=40) {
   render()
   union() {

     // Top Body
     rotate([0,-90,0])
     translate([TeeHeight(tee) - (TeeOuterDiameter(tee)/2),0,0])
     cylinder(r=TeeOuterRadius(tee), h=TeeWidth(tee) * 0.99, center=true, $fn=36);

     // Bottom Body
     translate([0,0,TeeCenter(tee) * 0.01])
     cylinder(r=TeeOuterRadius(tee), h=TeeCenter(tee) * 0.98, $fn=36);

     // Bottom Rim
     cylinder(r=TeeRimRadius(tee), h=TeeRimWidth(tee), $fn=36);


    // Rims
    for (i = [1, -1]) {

      // Rim
      translate([i*TeeWidth(tee)/2,0,TeeCenter(tee)])
      rotate([0,i*-90,0]) {
      cylinder(r=TeeRimRadius(tee), h=TeeRimWidth(tee), $fn=36);

      // Casting Infill
      translate([0,0,TeeRimWidth(tee)])
      cylinder(r1=TeeRimRadius(tee),
               r2=TeeOuterRadius(tee),
                h=0.05,
                $fn=36);
      }
    }
   }
};

module CrossFitting(tee, infill=true, hollow=false, $fn=40) {
  render()
  difference() {
    union() {

      // Horizontal Body
      rotate([0,-90,0])
      translate([TeeHeight(tee) - (TeeOuterDiameter(tee)/2),0,0])
      cylinder(r=TeeOuterRadius(tee), h=TeeWidth(tee) * 0.99, center=true, $fn=36);

      // Vertical Body
      translate([0,0,TeeCenter(tee) * 0.01])
      cylinder(r=TeeOuterRadius(tee), h=TeeWidth(tee) * 0.98, $fn=36);

      // Bottom Vertical Rim
      cylinder(r=TeeRimRadius(tee), h=TeeRimWidth(tee), $fn=36);

      // Top Vertical Rim
      translate([0,0,TeeWidth(tee)-TeeRimWidth(tee)])
      cylinder(r=TeeRimRadius(tee), h=TeeRimWidth(tee), $fn=36);

      // Rims
      for (i = [1, -1]) {

        // Rim
        translate([i*TeeWidth(tee)/2,0,TeeCenter(tee)])
        rotate([0,i*-90,0]) {
          cylinder(r=TeeRimRadius(tee), h=TeeRimWidth(tee), $fn=36);

          // Rim-Body Fillet
          translate([0,0,TeeRimWidth(tee)])
          cylinder(r1=TeeRimRadius(tee),
                   r2=TeeOuterRadius(tee),
                   h=0.05,
                   $fn=36);
        }
      }

      for (n=[-1,1]) // Top of cross-fitting
      for (i=[-1,1]) { // Sides of tee-fitting

      // Body-Corner Infill
      translate([0,0,TeeCenter(tee)])
      translate([i*TeeOuterRadius(tee)/2,0,n*-TeeOuterRadius(tee)/2])
      rotate([0,n*i*45,0])
      cylinder(r=TeeOuterRadius(tee), h=0.5, center=true);
      }
    }

    if (hollow)
    translate([0,0,TeeCenter(tee)])
    for (i=[0,1])
    rotate([0,90*i,0])
    cylinder(r=TeeInnerRadius(tee), h=TeeWidth(tee)*2, center=true);
  }
};

//Tee(TeeThreeQuarterInch);

module TeeRim(tee=Spec_TeeThreeQuarterInch(), height=1, clearance=0) {
  cylinder(r=TeeRimRadius(tee) + clearance, h=height, $fn=36);
}

// Fittings: Bushings
BushingHeight    = 1;
BushingDiameter  = 2;
BushingDepth     = 3; // Bushing screws in about half an inch
BushingCapWidth  = 4;
BushingCapHeight = 5;


// 3/4" Bushing
function Spec_BushingThreeQuarterInch() = [
  [BushingHeight,    1.165],
  [BushingDiameter,  1.06], // Measured 1.05, adding clearance
  [BushingDepth,     0.48],
  [BushingCapWidth,  1.227],
  [BushingCapHeight, 0.425]
];

function BushingHeight(bushing)    = lookup(BushingHeight, bushing);
function BushingDiameter(bushing)  = lookup(BushingDiameter, bushing);
function BushingRadius(bushing)    = lookup(BushingDiameter, bushing)/2;
function BushingDepth(bushing)     = lookup(BushingDepth, bushing);
function BushingExtension(bushing) = BushingHeight(bushing) - BushingDepth(bushing);
function BushingCapWidth(bushing)  = lookup(BushingCapWidth, bushing);
function BushingCapHeight(bushing) = lookup(BushingCapHeight, bushing);

module Bushing(spec=Spec_BushingThreeQuarterInch()) {

  od        = lookup(BushingDiameter, spec);
  height    = lookup(BushingHeight, spec);
  capWidth  = lookup(BushingCapWidth, spec);
  capHeight = lookup(BushingCapHeight, spec);

  union() {

    // Body
    translate([0,0,capHeight/2])
    cylinder(r=BushingRadius(spec), h=height - (BushingCapHeight(spec)/2), $fn=20);

    // Head
    cylinder(r=BushingCapWidth(spec)/2, h=BushingCapHeight(spec), $fn=6);
  }
}

CrossFitting(Spec_AnvilForgedSteel_TeeThreeQuarterInch());
